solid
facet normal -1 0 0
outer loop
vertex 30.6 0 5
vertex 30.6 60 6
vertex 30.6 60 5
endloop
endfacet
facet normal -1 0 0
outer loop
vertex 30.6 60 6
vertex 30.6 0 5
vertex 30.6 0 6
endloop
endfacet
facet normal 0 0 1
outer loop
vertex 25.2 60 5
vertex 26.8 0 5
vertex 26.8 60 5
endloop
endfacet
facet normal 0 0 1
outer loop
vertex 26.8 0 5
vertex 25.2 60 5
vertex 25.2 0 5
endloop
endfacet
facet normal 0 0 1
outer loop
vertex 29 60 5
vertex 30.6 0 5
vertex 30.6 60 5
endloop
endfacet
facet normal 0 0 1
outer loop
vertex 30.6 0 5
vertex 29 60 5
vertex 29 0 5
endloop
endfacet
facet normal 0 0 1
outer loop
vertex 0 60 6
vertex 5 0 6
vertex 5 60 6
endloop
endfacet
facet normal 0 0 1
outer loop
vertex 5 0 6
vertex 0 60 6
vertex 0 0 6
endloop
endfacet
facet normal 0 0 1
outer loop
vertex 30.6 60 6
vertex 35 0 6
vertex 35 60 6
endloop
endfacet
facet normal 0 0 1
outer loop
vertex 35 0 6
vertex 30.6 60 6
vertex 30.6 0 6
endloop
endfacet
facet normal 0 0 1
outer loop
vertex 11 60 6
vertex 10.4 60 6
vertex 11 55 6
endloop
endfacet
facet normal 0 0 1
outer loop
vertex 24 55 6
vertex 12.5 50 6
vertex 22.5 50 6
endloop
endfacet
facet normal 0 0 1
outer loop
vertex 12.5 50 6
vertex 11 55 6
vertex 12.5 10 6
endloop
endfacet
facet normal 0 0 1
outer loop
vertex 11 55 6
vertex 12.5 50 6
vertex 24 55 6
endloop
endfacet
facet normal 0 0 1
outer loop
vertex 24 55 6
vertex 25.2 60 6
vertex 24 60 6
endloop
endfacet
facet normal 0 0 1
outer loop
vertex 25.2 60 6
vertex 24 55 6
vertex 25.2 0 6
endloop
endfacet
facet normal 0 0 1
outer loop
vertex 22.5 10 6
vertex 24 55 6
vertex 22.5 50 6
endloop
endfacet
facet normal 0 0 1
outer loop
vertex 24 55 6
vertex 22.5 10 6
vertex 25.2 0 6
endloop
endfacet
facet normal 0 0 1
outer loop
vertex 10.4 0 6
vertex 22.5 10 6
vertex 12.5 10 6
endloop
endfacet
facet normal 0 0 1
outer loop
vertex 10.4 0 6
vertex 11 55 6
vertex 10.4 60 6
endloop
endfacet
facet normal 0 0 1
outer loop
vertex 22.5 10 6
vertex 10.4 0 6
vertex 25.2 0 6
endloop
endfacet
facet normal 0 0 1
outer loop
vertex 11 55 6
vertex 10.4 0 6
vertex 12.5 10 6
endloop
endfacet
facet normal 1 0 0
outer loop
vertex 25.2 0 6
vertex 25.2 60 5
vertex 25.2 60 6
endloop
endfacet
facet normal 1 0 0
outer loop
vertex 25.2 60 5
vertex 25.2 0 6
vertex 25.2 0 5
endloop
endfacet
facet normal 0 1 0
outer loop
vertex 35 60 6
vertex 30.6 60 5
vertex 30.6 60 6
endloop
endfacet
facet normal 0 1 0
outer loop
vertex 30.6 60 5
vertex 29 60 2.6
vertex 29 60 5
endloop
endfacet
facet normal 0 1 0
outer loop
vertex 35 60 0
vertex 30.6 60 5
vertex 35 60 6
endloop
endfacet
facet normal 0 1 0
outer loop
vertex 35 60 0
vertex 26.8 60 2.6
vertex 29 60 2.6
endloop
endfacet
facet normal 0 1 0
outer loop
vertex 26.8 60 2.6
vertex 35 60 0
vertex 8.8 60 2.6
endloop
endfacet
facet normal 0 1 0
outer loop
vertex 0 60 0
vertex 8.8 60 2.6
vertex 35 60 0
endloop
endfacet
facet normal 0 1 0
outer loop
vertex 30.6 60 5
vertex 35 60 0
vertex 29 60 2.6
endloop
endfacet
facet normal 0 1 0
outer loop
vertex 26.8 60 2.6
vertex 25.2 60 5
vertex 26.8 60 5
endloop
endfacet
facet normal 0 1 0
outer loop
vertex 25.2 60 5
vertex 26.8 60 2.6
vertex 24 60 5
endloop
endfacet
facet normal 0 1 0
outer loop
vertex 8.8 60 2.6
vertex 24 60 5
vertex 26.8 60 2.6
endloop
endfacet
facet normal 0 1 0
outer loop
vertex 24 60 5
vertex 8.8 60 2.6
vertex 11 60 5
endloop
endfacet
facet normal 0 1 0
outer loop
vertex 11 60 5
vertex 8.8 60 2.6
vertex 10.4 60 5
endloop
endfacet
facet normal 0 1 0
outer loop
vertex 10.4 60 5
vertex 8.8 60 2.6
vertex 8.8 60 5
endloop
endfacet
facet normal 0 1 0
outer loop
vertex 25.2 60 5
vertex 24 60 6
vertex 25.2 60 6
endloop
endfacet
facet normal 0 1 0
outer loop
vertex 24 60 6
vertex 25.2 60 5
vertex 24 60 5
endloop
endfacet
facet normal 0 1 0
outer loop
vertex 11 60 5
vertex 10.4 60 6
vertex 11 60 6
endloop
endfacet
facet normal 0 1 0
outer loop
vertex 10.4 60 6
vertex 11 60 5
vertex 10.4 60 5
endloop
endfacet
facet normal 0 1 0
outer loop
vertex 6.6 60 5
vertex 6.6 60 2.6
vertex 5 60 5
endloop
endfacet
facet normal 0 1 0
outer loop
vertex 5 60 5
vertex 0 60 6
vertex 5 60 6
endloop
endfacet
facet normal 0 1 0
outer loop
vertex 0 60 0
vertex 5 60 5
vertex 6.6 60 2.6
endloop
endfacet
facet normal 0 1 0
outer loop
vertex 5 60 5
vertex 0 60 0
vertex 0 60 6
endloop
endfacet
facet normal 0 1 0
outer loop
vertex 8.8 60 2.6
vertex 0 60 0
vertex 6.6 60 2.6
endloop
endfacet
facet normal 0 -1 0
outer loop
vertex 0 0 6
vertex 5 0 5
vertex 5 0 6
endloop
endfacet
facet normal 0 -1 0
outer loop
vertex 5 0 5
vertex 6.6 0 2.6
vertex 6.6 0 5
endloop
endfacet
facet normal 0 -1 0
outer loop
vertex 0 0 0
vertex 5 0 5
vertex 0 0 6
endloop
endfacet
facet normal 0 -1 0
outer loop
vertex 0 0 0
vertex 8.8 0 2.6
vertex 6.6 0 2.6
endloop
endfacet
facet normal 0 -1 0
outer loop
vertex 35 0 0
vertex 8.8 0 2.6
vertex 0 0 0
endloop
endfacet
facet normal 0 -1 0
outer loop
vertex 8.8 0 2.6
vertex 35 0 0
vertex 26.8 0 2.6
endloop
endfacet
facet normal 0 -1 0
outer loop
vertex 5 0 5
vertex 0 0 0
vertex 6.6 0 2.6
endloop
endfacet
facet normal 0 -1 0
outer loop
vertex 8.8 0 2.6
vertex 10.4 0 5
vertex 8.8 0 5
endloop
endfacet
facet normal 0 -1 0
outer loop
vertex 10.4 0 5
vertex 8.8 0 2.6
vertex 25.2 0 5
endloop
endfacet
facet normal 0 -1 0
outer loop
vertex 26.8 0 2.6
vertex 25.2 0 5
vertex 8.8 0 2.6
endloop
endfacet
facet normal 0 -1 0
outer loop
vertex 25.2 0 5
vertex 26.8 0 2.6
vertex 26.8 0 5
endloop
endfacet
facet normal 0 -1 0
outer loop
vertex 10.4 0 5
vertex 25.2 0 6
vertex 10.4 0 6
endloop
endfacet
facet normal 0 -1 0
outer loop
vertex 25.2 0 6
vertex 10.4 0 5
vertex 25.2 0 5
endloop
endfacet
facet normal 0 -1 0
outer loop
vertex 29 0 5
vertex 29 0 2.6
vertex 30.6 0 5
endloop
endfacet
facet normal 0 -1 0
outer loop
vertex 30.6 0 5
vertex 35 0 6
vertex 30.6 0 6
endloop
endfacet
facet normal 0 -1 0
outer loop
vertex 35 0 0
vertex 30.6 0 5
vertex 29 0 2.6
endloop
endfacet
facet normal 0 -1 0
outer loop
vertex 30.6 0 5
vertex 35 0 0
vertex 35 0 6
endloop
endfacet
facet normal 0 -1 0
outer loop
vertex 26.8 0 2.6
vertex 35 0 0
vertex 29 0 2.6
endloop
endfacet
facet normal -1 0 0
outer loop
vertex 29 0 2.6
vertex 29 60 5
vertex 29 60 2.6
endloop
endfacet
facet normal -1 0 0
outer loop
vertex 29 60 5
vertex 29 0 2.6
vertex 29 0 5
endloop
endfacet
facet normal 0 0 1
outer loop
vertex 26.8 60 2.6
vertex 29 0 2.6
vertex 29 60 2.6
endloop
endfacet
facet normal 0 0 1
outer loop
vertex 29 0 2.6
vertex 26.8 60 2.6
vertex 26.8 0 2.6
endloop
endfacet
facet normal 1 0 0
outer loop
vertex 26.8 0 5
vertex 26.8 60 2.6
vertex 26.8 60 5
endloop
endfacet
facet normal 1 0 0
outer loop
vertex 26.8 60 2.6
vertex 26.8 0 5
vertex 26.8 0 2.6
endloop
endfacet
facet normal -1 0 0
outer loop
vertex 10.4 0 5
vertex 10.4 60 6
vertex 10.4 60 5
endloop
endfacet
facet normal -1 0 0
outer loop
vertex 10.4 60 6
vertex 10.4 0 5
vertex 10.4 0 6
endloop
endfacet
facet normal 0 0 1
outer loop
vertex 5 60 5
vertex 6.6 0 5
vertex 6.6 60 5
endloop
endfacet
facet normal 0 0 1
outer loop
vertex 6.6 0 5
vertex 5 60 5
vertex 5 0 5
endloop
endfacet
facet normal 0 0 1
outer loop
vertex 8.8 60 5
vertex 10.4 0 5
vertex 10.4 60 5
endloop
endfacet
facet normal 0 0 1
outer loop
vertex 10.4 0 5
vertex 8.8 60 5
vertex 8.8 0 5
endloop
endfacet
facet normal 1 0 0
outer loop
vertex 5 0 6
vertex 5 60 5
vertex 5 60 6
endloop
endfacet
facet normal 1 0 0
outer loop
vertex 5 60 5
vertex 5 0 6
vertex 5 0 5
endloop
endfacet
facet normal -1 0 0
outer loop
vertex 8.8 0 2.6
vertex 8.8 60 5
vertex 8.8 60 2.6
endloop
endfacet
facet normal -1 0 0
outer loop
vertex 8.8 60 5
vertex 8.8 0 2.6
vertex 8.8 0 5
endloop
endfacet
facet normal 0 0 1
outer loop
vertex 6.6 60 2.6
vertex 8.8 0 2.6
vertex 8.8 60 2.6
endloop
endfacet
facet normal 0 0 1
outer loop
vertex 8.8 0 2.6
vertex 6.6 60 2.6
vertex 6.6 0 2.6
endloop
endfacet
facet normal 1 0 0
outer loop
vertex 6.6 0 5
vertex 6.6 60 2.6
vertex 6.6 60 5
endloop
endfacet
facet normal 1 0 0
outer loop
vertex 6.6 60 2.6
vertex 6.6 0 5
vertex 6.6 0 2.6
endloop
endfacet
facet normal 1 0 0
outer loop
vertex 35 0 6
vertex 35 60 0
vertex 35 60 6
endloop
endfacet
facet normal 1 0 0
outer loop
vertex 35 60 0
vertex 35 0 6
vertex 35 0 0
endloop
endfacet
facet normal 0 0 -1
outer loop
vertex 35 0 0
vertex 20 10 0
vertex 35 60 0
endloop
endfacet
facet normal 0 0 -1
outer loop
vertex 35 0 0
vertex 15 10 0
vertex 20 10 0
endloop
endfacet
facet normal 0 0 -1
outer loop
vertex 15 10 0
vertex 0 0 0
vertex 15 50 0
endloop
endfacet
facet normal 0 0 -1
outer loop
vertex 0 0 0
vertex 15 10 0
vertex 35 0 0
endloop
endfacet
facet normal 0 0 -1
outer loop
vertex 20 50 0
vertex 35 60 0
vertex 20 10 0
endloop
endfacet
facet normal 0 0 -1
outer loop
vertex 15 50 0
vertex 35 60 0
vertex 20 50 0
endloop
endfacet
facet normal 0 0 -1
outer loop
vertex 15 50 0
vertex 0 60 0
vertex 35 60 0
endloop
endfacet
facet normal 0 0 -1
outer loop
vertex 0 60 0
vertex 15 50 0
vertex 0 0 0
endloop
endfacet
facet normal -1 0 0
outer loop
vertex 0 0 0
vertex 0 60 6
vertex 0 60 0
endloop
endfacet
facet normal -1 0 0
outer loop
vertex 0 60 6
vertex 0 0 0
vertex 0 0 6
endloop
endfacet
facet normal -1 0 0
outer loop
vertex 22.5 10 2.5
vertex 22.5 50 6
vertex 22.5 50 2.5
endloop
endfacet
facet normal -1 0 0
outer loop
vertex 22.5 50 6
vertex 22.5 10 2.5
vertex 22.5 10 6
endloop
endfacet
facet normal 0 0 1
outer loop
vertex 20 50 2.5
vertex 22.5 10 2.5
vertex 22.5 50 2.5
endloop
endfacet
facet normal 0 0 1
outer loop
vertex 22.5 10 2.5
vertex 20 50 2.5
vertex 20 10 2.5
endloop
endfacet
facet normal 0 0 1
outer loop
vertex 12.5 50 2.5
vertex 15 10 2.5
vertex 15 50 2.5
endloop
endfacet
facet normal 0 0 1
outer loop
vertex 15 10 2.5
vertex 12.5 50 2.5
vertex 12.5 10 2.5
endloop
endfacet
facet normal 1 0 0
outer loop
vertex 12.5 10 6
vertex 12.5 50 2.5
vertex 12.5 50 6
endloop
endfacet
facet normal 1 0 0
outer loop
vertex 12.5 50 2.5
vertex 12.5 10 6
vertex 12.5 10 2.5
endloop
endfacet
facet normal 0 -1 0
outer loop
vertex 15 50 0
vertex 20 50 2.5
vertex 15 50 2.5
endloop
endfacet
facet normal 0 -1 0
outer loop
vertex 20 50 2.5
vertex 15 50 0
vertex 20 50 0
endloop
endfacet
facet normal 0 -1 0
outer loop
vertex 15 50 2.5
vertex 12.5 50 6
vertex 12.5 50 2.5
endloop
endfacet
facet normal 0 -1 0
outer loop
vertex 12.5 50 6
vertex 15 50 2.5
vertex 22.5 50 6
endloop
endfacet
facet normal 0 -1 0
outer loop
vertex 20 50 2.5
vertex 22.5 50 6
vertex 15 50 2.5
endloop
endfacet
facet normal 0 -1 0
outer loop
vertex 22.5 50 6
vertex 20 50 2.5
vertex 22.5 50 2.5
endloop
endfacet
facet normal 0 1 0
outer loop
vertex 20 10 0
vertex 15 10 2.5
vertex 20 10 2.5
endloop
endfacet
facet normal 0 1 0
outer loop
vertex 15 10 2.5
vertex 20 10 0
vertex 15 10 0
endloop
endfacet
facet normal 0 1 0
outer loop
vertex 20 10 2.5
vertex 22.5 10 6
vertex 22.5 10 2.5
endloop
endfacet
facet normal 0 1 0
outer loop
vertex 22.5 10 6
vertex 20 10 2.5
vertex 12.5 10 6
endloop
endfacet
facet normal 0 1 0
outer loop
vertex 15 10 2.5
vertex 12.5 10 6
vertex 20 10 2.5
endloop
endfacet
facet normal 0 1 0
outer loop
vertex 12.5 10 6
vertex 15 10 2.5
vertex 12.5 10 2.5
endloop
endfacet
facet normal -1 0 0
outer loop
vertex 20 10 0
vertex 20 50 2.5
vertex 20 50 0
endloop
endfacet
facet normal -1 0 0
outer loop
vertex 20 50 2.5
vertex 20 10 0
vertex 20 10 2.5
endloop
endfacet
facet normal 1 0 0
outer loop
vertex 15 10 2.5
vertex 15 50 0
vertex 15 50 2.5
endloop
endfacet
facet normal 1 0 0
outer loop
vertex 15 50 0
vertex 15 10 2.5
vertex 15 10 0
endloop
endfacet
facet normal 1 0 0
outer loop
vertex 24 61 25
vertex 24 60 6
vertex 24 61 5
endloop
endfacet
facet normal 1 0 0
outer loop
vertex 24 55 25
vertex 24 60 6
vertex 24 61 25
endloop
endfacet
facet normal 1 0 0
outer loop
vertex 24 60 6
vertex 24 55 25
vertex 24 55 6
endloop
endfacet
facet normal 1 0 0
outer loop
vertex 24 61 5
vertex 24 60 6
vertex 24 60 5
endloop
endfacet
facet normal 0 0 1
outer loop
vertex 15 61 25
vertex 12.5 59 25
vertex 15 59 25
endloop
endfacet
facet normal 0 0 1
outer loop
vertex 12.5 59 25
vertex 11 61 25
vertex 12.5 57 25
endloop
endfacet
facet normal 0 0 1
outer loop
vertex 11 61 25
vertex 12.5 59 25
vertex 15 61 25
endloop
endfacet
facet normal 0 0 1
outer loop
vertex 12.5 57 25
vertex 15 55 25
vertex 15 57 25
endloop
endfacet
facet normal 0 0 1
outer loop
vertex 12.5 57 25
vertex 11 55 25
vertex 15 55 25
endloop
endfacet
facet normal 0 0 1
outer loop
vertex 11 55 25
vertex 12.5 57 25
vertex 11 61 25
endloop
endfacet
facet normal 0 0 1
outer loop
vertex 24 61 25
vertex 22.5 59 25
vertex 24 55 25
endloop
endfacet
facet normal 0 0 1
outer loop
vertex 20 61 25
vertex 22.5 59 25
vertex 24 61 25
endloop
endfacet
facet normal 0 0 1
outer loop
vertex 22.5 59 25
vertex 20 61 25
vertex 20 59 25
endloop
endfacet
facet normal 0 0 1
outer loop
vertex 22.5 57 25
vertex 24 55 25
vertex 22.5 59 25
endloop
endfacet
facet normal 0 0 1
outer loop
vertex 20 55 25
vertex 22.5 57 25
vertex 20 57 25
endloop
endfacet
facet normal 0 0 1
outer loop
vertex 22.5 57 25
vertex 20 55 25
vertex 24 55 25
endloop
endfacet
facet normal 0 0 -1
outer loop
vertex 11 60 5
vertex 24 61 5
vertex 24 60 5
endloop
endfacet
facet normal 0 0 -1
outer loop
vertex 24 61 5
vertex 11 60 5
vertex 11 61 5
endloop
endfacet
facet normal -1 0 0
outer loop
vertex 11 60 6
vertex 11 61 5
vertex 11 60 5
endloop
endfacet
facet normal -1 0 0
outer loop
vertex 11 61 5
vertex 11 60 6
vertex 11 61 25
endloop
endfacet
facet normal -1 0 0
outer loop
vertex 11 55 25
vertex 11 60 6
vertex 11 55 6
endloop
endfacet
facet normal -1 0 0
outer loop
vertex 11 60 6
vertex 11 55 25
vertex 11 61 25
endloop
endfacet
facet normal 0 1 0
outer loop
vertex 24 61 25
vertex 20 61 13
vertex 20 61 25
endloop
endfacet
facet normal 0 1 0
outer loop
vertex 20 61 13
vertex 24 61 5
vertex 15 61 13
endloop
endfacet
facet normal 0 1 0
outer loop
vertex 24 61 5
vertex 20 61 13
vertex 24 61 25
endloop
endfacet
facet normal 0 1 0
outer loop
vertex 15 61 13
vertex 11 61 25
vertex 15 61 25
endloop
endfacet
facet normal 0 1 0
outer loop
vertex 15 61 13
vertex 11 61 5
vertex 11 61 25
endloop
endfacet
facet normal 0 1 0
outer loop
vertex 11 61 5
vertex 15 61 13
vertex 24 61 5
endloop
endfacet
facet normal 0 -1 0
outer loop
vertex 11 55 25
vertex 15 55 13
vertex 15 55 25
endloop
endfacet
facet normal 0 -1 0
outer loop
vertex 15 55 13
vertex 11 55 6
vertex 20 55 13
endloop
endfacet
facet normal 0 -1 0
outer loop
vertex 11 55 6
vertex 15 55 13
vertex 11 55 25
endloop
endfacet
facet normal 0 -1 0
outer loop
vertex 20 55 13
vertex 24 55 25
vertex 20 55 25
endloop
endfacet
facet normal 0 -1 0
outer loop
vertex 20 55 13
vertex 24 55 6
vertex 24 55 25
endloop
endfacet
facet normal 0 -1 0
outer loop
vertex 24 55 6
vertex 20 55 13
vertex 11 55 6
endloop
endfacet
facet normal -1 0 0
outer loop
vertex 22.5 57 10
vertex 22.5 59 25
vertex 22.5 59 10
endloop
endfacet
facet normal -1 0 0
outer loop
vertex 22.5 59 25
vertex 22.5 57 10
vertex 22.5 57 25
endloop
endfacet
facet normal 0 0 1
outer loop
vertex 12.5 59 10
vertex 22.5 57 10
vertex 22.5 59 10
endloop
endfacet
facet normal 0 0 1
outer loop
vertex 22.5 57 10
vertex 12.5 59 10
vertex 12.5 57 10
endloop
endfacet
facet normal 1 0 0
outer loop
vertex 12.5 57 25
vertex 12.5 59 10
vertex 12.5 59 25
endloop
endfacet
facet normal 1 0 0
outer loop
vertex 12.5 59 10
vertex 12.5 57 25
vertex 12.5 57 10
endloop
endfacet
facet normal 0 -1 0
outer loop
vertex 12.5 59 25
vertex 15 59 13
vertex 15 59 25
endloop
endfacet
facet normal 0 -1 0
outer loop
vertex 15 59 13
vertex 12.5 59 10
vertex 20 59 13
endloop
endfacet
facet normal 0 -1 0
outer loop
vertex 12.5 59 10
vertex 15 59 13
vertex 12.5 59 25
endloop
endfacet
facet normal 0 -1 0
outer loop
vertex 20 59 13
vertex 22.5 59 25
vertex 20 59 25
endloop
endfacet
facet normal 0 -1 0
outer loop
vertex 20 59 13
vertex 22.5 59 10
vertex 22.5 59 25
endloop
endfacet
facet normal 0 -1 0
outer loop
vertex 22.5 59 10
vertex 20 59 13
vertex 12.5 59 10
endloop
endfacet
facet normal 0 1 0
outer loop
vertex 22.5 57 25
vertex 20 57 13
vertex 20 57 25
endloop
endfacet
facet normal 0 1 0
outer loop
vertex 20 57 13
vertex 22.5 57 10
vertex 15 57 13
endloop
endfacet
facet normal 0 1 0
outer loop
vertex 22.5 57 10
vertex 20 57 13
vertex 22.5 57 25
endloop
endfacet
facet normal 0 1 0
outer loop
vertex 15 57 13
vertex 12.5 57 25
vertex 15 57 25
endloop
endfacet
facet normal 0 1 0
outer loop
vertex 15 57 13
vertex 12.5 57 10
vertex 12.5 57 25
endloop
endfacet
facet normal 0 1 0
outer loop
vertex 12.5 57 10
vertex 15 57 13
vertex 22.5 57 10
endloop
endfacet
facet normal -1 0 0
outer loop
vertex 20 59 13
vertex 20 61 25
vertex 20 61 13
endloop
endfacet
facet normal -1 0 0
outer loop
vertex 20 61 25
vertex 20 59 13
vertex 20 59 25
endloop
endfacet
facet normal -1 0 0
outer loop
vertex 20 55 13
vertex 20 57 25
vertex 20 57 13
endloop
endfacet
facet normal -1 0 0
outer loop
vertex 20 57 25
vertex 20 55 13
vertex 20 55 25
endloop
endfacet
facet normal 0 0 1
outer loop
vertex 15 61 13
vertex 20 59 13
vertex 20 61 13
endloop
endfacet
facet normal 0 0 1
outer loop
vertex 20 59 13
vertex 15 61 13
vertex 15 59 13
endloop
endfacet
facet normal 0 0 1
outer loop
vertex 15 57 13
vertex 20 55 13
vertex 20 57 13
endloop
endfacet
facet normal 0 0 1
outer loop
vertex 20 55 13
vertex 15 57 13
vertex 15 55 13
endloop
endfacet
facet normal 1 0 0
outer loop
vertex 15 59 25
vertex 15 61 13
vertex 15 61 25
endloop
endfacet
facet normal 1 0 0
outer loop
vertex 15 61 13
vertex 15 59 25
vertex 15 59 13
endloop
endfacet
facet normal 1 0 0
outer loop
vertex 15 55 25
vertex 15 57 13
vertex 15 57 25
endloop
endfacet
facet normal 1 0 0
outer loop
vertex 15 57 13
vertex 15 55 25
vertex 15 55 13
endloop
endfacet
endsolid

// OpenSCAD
//See 8mm-carriage.scad for documentation

module channel() {
    mirror ([0,0,1]) {
    union() {
        cube([5.4,60,1]);
        translate([1.6,0,0]) {cube([2.2,60,3.4]);}
        }
    }
}


difference() {
cube([35,60,6]);
translate([25.2,0,6]) {channel(); }
translate([5,0,6]) {channel(); }
translate([12.5,10,2.5]){cube([10,40,3.5]);}
translate([15,10,0]){cube([5,40,5]);}
}

difference(){
translate([11,55,5]){cube([13,6,20]);}
translate([12.5,57,10]){cube([10,2,15]);}
translate([15,55,13]){cube([5,6,12]);}
}
